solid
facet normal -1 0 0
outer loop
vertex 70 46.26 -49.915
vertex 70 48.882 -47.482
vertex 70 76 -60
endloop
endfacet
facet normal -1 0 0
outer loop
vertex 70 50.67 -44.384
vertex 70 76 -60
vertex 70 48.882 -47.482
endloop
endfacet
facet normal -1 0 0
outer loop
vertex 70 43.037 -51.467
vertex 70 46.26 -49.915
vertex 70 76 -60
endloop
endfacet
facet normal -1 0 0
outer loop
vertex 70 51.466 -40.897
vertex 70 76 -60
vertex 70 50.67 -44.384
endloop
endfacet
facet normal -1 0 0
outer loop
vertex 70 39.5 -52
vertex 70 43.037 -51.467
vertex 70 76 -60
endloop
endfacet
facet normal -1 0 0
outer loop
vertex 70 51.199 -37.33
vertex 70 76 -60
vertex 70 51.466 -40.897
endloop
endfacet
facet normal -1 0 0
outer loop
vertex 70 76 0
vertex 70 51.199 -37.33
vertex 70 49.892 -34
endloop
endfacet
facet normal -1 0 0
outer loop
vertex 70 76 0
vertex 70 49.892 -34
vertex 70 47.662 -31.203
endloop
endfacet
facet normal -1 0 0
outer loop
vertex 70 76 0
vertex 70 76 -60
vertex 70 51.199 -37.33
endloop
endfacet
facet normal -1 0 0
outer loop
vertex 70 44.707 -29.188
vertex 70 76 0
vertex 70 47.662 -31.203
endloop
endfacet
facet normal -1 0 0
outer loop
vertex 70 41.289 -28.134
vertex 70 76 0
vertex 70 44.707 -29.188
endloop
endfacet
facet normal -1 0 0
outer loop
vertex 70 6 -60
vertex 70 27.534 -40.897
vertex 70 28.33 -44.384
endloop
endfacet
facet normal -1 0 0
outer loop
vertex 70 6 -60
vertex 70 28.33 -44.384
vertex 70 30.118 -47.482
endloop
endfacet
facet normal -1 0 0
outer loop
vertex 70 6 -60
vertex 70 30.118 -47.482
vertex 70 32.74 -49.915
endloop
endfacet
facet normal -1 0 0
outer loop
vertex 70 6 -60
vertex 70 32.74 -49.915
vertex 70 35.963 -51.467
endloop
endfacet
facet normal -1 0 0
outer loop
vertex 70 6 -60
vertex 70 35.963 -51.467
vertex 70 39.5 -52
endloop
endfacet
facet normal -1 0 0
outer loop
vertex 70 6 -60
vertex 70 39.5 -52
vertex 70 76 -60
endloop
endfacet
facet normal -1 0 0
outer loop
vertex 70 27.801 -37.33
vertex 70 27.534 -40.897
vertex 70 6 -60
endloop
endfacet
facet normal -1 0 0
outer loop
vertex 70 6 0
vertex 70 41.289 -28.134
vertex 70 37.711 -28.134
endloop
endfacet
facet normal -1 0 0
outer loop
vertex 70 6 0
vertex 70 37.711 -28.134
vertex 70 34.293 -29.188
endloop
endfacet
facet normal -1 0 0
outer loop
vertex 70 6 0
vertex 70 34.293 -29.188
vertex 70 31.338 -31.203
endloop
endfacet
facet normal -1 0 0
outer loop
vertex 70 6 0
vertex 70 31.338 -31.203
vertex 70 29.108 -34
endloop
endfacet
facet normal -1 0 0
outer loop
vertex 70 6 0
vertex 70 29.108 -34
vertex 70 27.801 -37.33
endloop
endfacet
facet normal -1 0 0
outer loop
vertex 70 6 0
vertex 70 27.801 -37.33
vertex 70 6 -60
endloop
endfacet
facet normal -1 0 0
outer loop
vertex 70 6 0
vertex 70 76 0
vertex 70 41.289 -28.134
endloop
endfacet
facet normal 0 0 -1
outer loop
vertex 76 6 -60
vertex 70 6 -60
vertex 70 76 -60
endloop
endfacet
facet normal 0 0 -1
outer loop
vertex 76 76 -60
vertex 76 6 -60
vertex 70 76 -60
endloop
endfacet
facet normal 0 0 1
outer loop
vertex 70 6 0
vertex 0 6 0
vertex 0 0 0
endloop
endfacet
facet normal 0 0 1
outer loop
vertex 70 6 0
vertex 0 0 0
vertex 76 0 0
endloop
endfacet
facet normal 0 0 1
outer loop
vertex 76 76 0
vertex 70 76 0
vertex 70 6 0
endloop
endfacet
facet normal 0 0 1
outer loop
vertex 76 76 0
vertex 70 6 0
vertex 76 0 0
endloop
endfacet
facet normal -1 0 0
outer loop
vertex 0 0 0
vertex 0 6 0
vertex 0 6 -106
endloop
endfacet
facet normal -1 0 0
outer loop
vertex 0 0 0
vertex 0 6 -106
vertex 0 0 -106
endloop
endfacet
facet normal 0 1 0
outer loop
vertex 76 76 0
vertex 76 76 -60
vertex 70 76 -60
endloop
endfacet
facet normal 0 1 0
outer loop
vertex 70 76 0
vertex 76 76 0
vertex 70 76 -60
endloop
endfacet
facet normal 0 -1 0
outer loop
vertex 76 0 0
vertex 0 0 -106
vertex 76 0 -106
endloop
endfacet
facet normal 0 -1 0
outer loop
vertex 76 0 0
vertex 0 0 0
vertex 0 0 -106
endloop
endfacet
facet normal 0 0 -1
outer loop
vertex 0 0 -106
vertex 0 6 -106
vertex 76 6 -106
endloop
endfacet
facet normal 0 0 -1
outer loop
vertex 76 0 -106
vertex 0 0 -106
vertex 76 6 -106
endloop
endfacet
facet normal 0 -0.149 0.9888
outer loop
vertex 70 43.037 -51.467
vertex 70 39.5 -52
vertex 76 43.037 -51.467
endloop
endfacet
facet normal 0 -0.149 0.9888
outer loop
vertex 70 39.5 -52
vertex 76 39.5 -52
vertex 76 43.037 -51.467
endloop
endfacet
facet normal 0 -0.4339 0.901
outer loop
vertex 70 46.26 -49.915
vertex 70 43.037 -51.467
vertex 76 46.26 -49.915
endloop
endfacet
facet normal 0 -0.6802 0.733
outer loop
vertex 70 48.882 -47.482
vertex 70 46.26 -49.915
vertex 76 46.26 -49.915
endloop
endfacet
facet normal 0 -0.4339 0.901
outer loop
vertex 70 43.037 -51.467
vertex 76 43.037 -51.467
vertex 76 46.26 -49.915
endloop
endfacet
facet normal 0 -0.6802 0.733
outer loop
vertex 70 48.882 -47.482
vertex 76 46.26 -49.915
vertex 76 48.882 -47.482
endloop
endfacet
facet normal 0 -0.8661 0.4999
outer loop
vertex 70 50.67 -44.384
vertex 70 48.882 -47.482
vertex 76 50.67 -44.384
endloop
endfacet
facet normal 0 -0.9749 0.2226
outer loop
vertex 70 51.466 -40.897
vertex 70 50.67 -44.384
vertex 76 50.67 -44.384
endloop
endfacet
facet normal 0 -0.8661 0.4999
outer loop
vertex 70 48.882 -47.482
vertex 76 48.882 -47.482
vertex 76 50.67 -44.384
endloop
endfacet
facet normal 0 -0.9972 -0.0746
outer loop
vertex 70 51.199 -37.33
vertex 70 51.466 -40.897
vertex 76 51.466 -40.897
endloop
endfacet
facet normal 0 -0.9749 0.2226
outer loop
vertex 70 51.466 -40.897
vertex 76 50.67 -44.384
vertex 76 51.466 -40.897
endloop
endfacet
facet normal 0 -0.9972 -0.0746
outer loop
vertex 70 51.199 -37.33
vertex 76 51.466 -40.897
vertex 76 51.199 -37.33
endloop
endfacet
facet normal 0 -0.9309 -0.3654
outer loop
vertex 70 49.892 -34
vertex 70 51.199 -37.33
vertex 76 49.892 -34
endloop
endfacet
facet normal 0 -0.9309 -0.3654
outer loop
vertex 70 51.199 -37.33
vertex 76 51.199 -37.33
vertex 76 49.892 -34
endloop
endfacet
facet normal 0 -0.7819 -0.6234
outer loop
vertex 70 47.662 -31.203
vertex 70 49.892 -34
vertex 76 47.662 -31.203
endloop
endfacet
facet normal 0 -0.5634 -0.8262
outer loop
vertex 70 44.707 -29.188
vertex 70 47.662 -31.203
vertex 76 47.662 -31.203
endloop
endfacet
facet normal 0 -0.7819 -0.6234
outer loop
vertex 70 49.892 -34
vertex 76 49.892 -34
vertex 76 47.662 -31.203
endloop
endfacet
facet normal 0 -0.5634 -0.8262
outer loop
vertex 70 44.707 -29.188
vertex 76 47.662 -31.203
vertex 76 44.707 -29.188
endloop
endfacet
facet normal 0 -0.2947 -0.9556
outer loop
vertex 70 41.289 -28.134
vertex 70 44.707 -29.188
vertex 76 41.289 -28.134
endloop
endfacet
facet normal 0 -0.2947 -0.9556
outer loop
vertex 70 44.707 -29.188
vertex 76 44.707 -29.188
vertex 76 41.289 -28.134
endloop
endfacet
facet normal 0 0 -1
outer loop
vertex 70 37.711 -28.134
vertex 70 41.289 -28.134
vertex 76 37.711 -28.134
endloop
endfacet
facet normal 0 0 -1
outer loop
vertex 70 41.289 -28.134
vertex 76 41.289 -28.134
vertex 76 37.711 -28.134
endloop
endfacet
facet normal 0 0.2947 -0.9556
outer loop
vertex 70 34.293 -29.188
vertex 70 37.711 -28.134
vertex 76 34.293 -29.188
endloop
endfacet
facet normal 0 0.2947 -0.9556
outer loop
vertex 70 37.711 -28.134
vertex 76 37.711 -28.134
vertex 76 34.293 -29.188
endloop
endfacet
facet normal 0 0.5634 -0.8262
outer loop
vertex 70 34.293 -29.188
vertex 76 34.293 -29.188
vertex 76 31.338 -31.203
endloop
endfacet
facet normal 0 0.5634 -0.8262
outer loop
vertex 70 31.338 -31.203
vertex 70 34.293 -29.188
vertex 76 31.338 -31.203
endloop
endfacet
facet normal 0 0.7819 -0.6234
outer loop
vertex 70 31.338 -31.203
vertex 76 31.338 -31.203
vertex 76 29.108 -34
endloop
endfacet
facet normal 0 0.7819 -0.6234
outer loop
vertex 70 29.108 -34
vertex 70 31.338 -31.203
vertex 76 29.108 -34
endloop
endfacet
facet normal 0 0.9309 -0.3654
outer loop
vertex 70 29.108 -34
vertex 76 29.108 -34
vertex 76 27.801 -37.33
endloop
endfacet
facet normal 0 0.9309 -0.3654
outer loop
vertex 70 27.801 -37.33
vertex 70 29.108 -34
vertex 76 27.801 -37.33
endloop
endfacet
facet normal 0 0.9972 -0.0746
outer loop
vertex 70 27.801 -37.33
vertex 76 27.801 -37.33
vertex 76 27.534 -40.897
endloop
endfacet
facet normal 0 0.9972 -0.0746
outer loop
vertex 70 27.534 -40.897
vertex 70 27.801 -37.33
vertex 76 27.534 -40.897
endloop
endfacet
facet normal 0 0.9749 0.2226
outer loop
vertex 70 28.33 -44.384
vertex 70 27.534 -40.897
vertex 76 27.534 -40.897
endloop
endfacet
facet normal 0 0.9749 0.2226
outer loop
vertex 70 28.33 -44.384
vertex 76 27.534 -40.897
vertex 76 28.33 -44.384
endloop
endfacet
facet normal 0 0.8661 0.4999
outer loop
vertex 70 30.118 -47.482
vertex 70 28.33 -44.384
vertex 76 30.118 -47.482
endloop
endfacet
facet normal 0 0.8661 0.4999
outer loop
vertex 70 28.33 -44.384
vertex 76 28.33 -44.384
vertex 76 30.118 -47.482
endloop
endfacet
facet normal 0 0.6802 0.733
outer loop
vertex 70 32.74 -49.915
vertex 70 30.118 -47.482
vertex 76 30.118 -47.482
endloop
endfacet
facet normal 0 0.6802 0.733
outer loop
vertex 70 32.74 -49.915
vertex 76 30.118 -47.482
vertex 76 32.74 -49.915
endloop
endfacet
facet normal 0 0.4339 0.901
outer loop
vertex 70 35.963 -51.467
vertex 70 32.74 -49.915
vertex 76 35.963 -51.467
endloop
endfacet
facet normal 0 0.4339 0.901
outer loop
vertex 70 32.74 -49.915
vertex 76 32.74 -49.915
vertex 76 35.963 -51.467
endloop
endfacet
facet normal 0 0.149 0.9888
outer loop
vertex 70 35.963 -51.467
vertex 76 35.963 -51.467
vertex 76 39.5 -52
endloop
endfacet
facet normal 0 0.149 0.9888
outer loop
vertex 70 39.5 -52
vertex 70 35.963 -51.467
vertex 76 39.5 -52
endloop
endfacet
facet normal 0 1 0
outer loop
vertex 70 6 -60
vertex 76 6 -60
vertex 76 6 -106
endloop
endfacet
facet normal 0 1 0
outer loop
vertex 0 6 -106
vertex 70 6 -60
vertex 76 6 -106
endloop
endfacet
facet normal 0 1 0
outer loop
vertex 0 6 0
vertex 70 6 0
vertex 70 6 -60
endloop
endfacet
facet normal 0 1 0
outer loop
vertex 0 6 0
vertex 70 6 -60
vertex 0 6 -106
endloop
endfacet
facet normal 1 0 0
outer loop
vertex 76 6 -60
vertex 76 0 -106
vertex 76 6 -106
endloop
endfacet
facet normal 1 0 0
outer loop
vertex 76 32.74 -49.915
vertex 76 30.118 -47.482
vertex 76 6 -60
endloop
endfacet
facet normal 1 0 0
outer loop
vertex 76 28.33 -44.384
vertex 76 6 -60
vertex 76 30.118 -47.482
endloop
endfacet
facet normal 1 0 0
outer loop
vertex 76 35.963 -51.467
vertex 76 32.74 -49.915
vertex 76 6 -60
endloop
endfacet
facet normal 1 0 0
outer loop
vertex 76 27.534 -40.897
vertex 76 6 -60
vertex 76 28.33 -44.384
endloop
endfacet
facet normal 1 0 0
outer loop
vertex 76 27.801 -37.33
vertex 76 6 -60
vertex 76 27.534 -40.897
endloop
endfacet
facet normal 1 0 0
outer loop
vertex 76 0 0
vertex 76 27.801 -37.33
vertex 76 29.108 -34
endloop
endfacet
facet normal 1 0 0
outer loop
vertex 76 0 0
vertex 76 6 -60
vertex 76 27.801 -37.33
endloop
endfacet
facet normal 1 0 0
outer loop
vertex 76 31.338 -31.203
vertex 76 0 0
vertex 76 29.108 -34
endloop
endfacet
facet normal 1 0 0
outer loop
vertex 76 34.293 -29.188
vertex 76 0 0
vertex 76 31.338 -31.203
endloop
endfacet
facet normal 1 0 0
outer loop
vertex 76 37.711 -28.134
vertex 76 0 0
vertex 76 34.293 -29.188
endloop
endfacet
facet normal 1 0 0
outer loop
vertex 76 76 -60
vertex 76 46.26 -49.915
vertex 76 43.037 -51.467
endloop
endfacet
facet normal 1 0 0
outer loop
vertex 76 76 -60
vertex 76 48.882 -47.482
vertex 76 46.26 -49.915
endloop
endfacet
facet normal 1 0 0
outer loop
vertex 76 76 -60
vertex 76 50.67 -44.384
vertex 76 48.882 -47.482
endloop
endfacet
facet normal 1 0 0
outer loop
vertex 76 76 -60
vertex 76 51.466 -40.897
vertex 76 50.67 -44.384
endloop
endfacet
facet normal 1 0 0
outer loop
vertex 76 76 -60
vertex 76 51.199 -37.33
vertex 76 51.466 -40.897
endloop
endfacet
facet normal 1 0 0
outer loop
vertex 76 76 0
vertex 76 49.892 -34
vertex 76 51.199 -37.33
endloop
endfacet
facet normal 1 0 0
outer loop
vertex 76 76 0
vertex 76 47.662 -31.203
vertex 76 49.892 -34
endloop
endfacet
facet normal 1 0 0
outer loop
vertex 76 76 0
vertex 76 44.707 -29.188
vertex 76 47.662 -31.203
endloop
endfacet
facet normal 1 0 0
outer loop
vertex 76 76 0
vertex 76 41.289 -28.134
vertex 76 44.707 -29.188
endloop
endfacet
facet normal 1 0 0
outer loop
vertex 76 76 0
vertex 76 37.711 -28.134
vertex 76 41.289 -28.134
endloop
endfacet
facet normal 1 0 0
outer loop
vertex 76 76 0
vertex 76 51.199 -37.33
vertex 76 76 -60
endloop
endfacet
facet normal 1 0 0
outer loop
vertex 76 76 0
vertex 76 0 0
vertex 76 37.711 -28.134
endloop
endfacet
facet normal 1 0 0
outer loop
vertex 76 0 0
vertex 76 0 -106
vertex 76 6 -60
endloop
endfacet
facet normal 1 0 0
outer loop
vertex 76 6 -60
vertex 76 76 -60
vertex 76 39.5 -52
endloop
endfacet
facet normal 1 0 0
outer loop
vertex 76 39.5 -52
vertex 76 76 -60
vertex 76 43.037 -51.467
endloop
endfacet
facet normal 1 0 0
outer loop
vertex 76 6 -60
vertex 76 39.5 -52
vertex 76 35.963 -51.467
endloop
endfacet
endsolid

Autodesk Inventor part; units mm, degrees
ref_plane "YZ Plane" through (0, 0, 0) normal (1, 0, 0) x (0, 1, 0)
ref_plane "XZ Plane" through (0, 0, 0) normal (0, 1, 0) x (-1, 0, 0)
ref_plane "XY Plane" through (0, 0, 0) normal (0, 0, 1) x (1, 0, 0)
sketch "Sketch1" plane through (0, 0, 0) normal (0, 0, 1) x (1, 0, 0)
  point P0 (0, 0)
sketch "Sketch2" plane through (0, 0, 0) normal (0, 0, 1) x (1, 0, 0)
  line L0 (0, 0) -> (76, 0)
  line L1 (76, 0) -> (76, 76)
  line L2 (76, 76) -> (0, 76)
  line L3 (0, 76) -> (0, 0)
  line L4 (70, 6) -> (6, 6)
  line L5 (6, 6) -> (6, 70)
  line L6 (6, 70) -> (70, 70)
  line L7 (70, 70) -> (70, 6)
  line L8 (6, 6) -> (0, 6)
  line L9 (70, 70) -> (70, 76)
  dimension "d0" = 76
  dimension "d1" = 76
  dimension "d2" = 6
extrude "Extrusion1" add sketch "Sketch2" against normal blind 106 contours L3 L8 L4 L7 L9 L2 L1 L0
sketch "Sketch3" plane through (76, 76, 0) normal (1, 0, 0) x (0, 0, -1)
  line L0 (106, 0) -> (106, -76) projected
  line L1 (0, 0) -> (106, 0) projected
  line L2 (0, -76) -> (0, 0) projected
  circle A0 centre (40, -36.5) radius 12
  line L3 (0, -76) -> (106, -76) projected
  dimension "d6" = 24
  dimension "d7" = 40
extrude "Extrusion2" cut sketch "Sketch3" against normal blind 76 contours A0
sketch "Sketch5" plane through (70, 76, -106) normal (-1, 0, 0) x (0, 0, 1)
  line L0 (0, -70) -> (106, -70) projected
  line L1 (106, 0) -> (0, 0) projected
  line L2 (106, -70) -> (46, -70)
  line L3 (46, -70) -> (46, 0)
  line L4 (46, 0) -> (106, 0)
  line L5 (106, 0) -> (106, -70)
  line L6 (0, -70) -> (0, 0) projected
  line L7 (0, 0) -> (46, 0)
  line L8 (46, 0) -> (46, -70)
  line L9 (46, -70) -> (0, -70)
  line L10 (0, -70) -> (0, 0)
  point P0 (106, -76)
  dimension "d23" = 60
extrude "Extrusion3" cut sketch "Sketch5" against normal blind 10 contours L6 L1 L3 L0
properties part number "P005" material "Aluminum 6061"
